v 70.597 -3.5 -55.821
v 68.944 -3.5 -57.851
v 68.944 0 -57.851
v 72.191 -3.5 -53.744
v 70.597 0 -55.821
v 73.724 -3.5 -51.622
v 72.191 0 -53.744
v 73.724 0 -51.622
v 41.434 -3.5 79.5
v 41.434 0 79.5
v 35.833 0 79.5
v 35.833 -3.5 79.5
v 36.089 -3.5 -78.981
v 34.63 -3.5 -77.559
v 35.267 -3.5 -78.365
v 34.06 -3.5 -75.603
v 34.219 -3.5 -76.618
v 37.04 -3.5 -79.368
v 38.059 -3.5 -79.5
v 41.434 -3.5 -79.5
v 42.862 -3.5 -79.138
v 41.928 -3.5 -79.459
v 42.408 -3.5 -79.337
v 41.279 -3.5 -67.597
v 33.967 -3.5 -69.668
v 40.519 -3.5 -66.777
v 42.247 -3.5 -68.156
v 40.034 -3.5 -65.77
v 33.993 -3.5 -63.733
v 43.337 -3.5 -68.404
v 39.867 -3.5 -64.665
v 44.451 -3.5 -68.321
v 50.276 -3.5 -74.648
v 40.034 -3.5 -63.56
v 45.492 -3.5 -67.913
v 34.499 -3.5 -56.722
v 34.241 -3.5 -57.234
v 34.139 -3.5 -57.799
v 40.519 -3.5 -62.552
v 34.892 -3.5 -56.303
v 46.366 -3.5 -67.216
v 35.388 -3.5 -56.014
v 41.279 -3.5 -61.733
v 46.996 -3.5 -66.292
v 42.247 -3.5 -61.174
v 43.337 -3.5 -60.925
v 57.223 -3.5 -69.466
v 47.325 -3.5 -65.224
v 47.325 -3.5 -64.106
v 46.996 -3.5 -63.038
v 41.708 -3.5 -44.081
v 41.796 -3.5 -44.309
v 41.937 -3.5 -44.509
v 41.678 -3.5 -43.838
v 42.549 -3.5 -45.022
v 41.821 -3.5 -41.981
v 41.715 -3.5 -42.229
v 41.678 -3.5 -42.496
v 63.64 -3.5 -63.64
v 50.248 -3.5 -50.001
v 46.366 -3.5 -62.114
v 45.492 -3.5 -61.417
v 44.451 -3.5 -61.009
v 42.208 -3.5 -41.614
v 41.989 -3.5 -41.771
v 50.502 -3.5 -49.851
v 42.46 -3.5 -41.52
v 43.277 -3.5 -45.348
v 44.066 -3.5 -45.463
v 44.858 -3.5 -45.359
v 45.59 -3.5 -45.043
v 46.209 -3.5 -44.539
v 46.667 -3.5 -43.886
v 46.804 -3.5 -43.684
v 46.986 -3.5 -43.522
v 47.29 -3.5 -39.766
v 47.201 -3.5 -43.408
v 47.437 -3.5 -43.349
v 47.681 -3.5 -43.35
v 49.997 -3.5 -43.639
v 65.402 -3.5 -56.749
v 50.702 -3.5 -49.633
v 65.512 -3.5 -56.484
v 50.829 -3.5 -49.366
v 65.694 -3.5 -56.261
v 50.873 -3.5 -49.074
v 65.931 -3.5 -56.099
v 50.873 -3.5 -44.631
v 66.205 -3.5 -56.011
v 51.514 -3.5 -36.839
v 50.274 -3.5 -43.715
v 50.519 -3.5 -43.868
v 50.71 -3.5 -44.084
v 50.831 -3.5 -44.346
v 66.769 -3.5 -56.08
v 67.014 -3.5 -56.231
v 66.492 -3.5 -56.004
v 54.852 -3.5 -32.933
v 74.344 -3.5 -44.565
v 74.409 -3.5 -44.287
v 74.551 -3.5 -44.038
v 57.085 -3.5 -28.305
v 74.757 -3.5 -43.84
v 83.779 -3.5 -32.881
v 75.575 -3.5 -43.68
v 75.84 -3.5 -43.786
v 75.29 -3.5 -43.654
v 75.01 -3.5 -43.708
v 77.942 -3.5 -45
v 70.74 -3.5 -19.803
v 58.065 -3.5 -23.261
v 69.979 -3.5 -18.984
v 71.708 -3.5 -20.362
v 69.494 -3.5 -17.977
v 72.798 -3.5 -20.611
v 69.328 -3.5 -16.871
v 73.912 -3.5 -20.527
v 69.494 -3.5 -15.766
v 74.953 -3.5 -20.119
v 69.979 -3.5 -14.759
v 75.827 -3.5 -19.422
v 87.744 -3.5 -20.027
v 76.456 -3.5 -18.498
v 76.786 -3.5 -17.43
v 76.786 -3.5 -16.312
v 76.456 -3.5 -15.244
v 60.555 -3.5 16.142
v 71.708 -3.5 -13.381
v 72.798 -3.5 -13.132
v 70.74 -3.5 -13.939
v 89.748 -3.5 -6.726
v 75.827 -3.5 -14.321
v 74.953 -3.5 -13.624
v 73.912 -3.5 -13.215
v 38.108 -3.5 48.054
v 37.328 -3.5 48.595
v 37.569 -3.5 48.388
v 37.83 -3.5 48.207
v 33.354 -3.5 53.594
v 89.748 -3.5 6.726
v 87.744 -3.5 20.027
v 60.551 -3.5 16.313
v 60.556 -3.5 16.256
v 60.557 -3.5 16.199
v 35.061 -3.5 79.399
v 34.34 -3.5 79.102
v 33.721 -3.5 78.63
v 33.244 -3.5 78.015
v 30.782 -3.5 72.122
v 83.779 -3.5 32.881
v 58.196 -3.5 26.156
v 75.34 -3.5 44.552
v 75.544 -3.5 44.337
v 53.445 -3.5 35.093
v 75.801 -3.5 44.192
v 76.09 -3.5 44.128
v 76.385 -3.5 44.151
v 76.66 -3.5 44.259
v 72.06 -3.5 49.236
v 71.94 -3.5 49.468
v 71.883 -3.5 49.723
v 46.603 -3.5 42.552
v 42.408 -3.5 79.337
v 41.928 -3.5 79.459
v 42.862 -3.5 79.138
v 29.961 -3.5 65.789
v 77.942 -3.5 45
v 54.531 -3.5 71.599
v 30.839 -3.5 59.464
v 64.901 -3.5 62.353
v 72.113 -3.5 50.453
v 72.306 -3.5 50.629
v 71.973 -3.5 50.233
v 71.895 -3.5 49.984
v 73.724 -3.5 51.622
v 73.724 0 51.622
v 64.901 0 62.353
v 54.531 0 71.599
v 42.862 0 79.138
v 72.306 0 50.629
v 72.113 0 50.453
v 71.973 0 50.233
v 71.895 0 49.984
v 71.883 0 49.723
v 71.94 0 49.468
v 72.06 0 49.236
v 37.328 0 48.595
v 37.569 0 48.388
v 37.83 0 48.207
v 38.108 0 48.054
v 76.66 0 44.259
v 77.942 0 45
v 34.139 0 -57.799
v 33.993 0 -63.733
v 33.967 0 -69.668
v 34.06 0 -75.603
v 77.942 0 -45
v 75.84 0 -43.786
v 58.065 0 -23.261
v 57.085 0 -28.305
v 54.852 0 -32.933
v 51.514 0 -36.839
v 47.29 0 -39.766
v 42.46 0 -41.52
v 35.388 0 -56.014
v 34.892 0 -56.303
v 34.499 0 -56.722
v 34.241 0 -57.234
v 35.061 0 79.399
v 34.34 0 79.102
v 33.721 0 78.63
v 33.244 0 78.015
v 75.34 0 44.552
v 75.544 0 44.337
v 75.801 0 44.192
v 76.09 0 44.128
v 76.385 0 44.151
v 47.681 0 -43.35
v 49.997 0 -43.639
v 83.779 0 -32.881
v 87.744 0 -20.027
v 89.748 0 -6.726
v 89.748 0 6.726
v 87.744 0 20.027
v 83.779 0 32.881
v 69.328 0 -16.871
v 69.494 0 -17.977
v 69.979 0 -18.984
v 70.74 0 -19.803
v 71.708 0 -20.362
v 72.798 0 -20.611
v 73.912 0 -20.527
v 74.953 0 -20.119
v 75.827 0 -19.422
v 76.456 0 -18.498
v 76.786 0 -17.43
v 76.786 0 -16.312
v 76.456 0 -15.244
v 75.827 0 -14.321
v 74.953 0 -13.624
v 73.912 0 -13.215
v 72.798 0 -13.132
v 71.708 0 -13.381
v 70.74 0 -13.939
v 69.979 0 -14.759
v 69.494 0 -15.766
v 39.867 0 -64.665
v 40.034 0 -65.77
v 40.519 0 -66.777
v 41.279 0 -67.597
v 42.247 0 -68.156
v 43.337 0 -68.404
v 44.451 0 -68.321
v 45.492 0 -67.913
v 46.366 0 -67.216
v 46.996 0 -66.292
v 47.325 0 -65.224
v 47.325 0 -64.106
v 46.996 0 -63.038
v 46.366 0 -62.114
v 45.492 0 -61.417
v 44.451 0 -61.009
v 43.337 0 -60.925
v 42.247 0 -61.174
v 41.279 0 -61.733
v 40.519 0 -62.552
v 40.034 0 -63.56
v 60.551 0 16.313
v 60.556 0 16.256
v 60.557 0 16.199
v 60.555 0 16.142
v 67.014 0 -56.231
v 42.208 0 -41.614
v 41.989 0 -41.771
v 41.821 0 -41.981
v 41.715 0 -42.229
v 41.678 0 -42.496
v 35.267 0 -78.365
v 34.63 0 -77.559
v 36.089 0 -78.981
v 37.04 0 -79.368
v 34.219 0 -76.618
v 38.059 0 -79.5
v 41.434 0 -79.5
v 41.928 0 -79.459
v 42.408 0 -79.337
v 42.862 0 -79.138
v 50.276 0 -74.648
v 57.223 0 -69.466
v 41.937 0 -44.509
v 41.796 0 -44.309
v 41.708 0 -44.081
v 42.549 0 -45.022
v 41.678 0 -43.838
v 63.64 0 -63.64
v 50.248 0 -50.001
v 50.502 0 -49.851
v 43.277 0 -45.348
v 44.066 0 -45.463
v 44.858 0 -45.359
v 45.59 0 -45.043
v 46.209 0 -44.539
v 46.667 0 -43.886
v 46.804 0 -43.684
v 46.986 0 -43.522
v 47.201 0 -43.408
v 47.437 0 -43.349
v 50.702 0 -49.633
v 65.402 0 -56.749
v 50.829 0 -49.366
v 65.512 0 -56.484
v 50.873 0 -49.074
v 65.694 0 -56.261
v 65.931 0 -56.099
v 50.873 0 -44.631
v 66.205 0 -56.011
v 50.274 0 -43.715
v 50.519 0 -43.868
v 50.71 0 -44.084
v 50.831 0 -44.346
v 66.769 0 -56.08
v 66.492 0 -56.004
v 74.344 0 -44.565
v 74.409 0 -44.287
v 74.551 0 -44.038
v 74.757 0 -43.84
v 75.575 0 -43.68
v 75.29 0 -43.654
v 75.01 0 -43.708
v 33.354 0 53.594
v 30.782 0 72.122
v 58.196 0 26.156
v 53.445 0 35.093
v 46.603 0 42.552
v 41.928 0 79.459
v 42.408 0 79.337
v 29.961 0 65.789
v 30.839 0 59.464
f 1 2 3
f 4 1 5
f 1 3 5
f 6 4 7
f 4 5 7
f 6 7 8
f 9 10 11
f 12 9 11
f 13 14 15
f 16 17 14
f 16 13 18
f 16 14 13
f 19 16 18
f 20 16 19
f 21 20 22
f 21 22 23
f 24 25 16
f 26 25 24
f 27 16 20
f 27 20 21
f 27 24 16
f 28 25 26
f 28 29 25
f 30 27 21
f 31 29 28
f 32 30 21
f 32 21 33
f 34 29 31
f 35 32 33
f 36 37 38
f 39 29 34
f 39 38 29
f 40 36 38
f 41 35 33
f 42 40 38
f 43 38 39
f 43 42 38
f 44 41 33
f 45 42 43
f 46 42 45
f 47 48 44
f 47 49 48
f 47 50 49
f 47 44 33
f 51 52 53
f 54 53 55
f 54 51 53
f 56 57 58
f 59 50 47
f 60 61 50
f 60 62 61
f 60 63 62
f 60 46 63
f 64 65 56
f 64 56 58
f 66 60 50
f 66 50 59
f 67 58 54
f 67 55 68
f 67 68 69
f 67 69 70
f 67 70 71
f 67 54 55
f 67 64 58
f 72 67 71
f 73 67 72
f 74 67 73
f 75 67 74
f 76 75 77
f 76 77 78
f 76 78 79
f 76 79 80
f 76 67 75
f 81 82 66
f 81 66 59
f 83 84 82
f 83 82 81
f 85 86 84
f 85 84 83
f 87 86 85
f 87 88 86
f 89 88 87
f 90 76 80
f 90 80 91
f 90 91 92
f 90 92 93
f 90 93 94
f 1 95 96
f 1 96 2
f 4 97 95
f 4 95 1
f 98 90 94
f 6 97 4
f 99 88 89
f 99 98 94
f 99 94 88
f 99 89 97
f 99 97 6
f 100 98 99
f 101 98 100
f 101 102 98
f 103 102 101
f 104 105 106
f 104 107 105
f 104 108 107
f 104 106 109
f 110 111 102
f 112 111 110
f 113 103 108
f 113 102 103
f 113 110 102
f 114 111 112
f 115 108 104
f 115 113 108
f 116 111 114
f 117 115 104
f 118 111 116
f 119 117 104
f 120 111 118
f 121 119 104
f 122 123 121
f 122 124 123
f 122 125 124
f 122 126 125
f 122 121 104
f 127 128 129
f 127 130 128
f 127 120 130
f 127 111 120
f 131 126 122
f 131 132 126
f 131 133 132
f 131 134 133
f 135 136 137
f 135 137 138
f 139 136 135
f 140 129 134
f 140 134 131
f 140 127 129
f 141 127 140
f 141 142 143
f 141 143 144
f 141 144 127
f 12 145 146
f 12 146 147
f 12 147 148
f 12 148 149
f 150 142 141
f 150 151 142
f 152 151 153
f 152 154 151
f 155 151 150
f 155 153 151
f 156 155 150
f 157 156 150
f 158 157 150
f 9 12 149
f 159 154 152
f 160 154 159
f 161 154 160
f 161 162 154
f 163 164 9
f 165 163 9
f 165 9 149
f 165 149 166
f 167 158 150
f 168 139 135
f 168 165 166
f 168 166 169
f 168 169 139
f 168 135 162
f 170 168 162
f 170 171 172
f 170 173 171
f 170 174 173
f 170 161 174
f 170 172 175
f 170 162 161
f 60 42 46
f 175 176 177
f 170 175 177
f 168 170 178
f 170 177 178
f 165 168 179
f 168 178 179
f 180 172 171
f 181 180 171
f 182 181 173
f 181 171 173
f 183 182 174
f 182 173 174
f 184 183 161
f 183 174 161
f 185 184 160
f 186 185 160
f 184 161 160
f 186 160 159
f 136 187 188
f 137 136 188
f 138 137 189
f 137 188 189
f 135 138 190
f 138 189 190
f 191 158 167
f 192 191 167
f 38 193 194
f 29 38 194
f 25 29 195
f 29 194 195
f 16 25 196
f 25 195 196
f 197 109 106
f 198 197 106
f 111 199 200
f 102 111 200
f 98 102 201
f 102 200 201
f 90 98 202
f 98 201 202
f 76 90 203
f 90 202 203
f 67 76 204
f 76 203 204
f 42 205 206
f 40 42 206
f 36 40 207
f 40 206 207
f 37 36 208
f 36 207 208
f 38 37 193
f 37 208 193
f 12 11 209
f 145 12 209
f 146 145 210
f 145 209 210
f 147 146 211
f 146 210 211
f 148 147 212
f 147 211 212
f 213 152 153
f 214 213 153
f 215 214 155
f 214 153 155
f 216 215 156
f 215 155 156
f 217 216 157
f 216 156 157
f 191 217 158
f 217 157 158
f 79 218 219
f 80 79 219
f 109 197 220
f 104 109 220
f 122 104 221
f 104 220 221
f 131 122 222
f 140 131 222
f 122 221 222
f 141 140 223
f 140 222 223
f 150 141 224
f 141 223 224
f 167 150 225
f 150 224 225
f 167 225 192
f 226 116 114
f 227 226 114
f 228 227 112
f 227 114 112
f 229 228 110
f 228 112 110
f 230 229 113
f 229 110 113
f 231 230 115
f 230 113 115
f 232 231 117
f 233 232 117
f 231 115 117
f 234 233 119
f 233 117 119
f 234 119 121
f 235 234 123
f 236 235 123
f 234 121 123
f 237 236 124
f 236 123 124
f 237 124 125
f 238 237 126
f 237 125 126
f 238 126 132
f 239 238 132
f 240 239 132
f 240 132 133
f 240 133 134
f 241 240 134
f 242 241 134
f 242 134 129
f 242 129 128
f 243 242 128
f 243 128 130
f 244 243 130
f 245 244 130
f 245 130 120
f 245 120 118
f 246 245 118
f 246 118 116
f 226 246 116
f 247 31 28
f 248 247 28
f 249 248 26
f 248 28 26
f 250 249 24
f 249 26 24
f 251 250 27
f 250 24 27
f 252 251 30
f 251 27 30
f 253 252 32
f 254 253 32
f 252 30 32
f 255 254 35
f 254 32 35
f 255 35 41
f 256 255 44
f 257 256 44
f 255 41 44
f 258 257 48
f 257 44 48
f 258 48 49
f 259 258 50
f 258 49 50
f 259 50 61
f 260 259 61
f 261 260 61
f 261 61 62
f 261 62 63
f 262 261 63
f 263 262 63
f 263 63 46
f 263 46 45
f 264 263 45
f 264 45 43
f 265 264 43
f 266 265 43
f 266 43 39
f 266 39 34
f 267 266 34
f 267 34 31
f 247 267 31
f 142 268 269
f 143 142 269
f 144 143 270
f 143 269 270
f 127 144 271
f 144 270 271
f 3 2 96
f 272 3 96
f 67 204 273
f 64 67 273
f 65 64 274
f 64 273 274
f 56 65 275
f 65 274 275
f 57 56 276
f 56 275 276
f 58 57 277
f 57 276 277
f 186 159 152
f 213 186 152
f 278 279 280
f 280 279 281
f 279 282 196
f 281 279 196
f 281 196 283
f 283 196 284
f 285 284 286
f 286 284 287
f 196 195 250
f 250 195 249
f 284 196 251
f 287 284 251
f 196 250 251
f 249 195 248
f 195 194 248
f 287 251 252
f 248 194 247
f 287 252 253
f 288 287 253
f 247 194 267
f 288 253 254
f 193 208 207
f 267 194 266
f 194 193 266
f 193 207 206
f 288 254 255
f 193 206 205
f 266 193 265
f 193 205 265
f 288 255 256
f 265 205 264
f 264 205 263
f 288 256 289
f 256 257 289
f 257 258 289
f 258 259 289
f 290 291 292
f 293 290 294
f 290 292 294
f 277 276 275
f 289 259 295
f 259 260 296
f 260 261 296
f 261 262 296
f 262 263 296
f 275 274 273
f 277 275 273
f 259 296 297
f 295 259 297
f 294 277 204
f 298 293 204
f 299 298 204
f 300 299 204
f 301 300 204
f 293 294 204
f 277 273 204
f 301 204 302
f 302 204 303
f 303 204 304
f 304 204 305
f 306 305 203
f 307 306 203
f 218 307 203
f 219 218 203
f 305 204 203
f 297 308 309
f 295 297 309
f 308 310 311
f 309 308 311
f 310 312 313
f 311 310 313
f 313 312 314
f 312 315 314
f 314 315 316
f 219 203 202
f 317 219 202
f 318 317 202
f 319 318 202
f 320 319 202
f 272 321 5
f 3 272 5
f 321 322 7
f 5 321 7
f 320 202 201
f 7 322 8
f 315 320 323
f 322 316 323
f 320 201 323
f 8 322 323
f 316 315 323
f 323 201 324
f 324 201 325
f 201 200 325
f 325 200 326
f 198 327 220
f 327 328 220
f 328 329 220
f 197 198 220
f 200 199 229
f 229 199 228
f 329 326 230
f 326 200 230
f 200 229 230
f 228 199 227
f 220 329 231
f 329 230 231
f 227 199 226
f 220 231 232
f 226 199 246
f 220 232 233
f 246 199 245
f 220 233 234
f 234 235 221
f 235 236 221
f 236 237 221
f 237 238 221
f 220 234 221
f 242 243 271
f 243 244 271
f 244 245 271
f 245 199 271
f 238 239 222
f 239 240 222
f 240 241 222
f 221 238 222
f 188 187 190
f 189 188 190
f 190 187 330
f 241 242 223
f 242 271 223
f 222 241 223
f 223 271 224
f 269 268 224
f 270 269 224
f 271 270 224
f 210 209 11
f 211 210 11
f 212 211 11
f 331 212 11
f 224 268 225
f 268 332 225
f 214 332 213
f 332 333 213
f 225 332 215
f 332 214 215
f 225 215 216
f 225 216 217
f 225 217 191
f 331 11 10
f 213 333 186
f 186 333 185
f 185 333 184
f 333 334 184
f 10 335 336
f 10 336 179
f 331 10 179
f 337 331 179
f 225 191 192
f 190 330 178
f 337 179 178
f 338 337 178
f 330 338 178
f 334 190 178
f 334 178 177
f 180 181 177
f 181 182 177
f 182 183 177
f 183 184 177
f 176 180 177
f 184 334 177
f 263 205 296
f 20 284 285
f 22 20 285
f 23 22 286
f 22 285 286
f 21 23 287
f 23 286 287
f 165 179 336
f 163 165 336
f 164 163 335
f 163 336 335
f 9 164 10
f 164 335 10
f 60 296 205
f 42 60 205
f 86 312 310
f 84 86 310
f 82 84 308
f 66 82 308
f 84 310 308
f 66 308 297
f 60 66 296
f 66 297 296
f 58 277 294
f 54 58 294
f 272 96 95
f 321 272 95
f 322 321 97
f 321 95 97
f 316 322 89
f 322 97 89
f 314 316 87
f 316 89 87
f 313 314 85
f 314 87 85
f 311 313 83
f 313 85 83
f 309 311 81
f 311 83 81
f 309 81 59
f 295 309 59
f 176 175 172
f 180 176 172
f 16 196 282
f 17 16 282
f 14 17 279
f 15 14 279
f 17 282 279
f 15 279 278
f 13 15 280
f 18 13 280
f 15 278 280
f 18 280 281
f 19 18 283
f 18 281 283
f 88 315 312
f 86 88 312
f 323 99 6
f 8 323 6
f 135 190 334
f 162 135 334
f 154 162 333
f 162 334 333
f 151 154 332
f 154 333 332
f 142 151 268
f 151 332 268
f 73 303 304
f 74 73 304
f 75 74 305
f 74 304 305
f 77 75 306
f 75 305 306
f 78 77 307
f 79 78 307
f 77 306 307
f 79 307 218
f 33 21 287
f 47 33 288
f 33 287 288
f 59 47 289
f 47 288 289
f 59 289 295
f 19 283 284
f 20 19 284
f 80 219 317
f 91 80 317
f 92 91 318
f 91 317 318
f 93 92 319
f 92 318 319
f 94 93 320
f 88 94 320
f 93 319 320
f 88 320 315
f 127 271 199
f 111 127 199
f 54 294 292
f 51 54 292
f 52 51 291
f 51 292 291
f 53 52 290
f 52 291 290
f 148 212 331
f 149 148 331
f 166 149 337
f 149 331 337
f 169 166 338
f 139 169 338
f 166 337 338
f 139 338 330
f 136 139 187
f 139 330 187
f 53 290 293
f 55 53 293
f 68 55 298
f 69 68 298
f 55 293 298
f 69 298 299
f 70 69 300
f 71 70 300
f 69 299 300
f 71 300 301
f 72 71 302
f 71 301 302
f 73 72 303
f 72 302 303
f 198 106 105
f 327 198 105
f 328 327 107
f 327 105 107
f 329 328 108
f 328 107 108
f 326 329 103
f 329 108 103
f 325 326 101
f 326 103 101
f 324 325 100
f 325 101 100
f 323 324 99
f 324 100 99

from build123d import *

# Parameters (mm, degrees)
F1_DEPTH = 3.5
F2_D     = 7.5
F4_DEPTH = 25


with BuildPart() as f1:
    # F0 (on Front) → F1 (new body)
    with BuildSketch(Plane.XZ):
        with BuildLine():
            ThreePointArc((41.4336819508, -79.5), (42.1706374775, -79.4080743718), (42.8624296043, -79.1379310345))
            ThreePointArc((42.8624296043, -79.1379310345), (90, 0), (42.8624296043, 79.1379310345))
            ThreePointArc((42.8624296043, 79.1379310345), (42.1706374775, 79.4080743718), (41.4336819508, 79.5))
            Line((41.4336819508, 79.5), (35.8331652233, 79.5))
            ThreePointArc((35.8331652233, 79.5), (34.3404775581, 79.1022842916), (33.2435667811, 78.0145890229))
            ThreePointArc((33.2435667811, 78.0145890229), (30.1884169541, 62.5971202701), (37.3284684526, 48.5952651142))
            ThreePointArc((37.3284684526, 48.5952651142), (37.696787223, 48.2936203298), (38.1081859652, 48.054038679))
            ThreePointArc((38.1081859652, 48.054038679), (53.4450002112, 35.0932650584), (60.5514057613, 16.3129955125))
            ThreePointArc((60.5514057613, 16.3129955125), (60.556983556, 16.2276326693), (60.5552452702, 16.1421054506))
            Line((60.5552452702, 16.1421054506), (58.0653059802, -23.2613034815))
            ThreePointArc((58.0653059802, -23.2613034815), (53.3089478497, -34.9939813299), (42.4604654753, -41.5200139942))
            ThreePointArc((42.4604654753, -41.5200139942), (41.8979228629, -41.8706217716), (41.6782328608, -42.4960146939))
            Line((41.6782328608, -42.4960146939), (41.6782328608, -43.8381428359))
            ThreePointArc((41.6782328608, -43.8381428359), (41.7451451632, -44.1977917599), (41.9369275579, -44.5093108088))
            ThreePointArc((41.9369275579, -44.5093108088), (44.4656332073, -45.4380618454), (46.6673711793, -43.8858760796))
            ThreePointArc((46.6673711793, -43.8858760796), (47.0897331674, -43.4580841529), (47.6810548772, -43.3497595621))
            Line((47.6810548772, -43.3497595621), (49.9965035646, -43.6386380299))
            ThreePointArc((49.9965035646, -43.6386380299), (50.6223024281, -43.9690543814), (50.8727020195, -44.6309450275))
            Line((50.8727020195, -44.6309450275), (50.8727020195, -49.0738430408))
            ThreePointArc((50.8727020195, -49.0738430408), (50.7018924929, -49.6328091926), (50.2478157018, -50.0008218568))
            Line((50.2478157018, -50.0008218568), (35.3876870019, -56.0141605654))
            ThreePointArc((35.3876870019, -56.0141605654), (34.4991811471, -56.7215784312), (34.1391186959, -57.7987217467))
            ThreePointArc((34.1391186959, -57.7987217467), (33.9649542689, -66.7004891105), (34.0604191652, -75.6034482759))
            ThreePointArc((34.0604191652, -75.6034482759), (35.2674681933, -78.3647681497), (38.0590812482, -79.5))
            Line((38.0590812482, -79.5), (41.4336819508, -79.5))
        make_face()
    extrude(amount=F1_DEPTH)

    # F2 (through all)
    with Locations(Plane(origin=(0, 0, 0), x_dir=(1, 0, 0), z_dir=(0, 1, 0))):
        with Locations((73.0777548589, 16.8713290758), (43.6170464707, 64.6649306593)):
            Hole(F2_D / 2)

    # F3 (on face) → F4 (cut)
    with BuildSketch(Plane.XZ.offset(3.5)):
        with BuildLine():
            Line((76.6596311124, 44.2594586587), (77.9422863406, 45))
            ThreePointArc((77.9422863406, 45), (75.9052301232, 48.3569647512), (73.723683986, 51.6218792716))
            Line((73.723683986, 51.6218792716), (72.305921722, 50.629151447))
            ThreePointArc((72.305921722, 50.629151447), (71.8946904054, 49.9836475804), (72.0603461141, 49.2364229663))
            Line((72.0603461141, 49.2364229663), (75.3404790681, 44.5519076262))
            ThreePointArc((75.3404790681, 44.5519076262), (75.9431914985, 44.1491880554), (76.6596311124, 44.2594586587))
        make_face()
        with BuildLine():
            Line((74.3439292434, -44.5647694037), (73.723683986, -51.6218792716))
            ThreePointArc((73.723683986, -51.6218792716), (75.9052301232, -48.3569647512), (77.9422863406, -45))
            Line((77.9422863406, -45), (75.8400892015, -43.7862959158))
            ThreePointArc((75.8400892015, -43.7862959158), (74.8785169765, -43.7652186868), (74.3439292434, -44.5647694037))
        make_face()
        with BuildLine():
            Line((65.4019169356, -56.7492744962), (63.6396103068, -63.6396103068))
            ThreePointArc((63.6396103068, -63.6396103068), (66.3549603129, -60.8031186854), (68.9439998807, -57.8508848718))
            Line((68.9439998807, -57.8508848718), (67.0135186397, -56.2310187745))
            ThreePointArc((67.0135186397, -56.2310187745), (66.0645928824, -56.0450761197), (65.4019169356, -56.7492744962))
        make_face()
    extrude(amount=-F4_DEPTH, mode=Mode.SUBTRACT)


solid = f1.part
